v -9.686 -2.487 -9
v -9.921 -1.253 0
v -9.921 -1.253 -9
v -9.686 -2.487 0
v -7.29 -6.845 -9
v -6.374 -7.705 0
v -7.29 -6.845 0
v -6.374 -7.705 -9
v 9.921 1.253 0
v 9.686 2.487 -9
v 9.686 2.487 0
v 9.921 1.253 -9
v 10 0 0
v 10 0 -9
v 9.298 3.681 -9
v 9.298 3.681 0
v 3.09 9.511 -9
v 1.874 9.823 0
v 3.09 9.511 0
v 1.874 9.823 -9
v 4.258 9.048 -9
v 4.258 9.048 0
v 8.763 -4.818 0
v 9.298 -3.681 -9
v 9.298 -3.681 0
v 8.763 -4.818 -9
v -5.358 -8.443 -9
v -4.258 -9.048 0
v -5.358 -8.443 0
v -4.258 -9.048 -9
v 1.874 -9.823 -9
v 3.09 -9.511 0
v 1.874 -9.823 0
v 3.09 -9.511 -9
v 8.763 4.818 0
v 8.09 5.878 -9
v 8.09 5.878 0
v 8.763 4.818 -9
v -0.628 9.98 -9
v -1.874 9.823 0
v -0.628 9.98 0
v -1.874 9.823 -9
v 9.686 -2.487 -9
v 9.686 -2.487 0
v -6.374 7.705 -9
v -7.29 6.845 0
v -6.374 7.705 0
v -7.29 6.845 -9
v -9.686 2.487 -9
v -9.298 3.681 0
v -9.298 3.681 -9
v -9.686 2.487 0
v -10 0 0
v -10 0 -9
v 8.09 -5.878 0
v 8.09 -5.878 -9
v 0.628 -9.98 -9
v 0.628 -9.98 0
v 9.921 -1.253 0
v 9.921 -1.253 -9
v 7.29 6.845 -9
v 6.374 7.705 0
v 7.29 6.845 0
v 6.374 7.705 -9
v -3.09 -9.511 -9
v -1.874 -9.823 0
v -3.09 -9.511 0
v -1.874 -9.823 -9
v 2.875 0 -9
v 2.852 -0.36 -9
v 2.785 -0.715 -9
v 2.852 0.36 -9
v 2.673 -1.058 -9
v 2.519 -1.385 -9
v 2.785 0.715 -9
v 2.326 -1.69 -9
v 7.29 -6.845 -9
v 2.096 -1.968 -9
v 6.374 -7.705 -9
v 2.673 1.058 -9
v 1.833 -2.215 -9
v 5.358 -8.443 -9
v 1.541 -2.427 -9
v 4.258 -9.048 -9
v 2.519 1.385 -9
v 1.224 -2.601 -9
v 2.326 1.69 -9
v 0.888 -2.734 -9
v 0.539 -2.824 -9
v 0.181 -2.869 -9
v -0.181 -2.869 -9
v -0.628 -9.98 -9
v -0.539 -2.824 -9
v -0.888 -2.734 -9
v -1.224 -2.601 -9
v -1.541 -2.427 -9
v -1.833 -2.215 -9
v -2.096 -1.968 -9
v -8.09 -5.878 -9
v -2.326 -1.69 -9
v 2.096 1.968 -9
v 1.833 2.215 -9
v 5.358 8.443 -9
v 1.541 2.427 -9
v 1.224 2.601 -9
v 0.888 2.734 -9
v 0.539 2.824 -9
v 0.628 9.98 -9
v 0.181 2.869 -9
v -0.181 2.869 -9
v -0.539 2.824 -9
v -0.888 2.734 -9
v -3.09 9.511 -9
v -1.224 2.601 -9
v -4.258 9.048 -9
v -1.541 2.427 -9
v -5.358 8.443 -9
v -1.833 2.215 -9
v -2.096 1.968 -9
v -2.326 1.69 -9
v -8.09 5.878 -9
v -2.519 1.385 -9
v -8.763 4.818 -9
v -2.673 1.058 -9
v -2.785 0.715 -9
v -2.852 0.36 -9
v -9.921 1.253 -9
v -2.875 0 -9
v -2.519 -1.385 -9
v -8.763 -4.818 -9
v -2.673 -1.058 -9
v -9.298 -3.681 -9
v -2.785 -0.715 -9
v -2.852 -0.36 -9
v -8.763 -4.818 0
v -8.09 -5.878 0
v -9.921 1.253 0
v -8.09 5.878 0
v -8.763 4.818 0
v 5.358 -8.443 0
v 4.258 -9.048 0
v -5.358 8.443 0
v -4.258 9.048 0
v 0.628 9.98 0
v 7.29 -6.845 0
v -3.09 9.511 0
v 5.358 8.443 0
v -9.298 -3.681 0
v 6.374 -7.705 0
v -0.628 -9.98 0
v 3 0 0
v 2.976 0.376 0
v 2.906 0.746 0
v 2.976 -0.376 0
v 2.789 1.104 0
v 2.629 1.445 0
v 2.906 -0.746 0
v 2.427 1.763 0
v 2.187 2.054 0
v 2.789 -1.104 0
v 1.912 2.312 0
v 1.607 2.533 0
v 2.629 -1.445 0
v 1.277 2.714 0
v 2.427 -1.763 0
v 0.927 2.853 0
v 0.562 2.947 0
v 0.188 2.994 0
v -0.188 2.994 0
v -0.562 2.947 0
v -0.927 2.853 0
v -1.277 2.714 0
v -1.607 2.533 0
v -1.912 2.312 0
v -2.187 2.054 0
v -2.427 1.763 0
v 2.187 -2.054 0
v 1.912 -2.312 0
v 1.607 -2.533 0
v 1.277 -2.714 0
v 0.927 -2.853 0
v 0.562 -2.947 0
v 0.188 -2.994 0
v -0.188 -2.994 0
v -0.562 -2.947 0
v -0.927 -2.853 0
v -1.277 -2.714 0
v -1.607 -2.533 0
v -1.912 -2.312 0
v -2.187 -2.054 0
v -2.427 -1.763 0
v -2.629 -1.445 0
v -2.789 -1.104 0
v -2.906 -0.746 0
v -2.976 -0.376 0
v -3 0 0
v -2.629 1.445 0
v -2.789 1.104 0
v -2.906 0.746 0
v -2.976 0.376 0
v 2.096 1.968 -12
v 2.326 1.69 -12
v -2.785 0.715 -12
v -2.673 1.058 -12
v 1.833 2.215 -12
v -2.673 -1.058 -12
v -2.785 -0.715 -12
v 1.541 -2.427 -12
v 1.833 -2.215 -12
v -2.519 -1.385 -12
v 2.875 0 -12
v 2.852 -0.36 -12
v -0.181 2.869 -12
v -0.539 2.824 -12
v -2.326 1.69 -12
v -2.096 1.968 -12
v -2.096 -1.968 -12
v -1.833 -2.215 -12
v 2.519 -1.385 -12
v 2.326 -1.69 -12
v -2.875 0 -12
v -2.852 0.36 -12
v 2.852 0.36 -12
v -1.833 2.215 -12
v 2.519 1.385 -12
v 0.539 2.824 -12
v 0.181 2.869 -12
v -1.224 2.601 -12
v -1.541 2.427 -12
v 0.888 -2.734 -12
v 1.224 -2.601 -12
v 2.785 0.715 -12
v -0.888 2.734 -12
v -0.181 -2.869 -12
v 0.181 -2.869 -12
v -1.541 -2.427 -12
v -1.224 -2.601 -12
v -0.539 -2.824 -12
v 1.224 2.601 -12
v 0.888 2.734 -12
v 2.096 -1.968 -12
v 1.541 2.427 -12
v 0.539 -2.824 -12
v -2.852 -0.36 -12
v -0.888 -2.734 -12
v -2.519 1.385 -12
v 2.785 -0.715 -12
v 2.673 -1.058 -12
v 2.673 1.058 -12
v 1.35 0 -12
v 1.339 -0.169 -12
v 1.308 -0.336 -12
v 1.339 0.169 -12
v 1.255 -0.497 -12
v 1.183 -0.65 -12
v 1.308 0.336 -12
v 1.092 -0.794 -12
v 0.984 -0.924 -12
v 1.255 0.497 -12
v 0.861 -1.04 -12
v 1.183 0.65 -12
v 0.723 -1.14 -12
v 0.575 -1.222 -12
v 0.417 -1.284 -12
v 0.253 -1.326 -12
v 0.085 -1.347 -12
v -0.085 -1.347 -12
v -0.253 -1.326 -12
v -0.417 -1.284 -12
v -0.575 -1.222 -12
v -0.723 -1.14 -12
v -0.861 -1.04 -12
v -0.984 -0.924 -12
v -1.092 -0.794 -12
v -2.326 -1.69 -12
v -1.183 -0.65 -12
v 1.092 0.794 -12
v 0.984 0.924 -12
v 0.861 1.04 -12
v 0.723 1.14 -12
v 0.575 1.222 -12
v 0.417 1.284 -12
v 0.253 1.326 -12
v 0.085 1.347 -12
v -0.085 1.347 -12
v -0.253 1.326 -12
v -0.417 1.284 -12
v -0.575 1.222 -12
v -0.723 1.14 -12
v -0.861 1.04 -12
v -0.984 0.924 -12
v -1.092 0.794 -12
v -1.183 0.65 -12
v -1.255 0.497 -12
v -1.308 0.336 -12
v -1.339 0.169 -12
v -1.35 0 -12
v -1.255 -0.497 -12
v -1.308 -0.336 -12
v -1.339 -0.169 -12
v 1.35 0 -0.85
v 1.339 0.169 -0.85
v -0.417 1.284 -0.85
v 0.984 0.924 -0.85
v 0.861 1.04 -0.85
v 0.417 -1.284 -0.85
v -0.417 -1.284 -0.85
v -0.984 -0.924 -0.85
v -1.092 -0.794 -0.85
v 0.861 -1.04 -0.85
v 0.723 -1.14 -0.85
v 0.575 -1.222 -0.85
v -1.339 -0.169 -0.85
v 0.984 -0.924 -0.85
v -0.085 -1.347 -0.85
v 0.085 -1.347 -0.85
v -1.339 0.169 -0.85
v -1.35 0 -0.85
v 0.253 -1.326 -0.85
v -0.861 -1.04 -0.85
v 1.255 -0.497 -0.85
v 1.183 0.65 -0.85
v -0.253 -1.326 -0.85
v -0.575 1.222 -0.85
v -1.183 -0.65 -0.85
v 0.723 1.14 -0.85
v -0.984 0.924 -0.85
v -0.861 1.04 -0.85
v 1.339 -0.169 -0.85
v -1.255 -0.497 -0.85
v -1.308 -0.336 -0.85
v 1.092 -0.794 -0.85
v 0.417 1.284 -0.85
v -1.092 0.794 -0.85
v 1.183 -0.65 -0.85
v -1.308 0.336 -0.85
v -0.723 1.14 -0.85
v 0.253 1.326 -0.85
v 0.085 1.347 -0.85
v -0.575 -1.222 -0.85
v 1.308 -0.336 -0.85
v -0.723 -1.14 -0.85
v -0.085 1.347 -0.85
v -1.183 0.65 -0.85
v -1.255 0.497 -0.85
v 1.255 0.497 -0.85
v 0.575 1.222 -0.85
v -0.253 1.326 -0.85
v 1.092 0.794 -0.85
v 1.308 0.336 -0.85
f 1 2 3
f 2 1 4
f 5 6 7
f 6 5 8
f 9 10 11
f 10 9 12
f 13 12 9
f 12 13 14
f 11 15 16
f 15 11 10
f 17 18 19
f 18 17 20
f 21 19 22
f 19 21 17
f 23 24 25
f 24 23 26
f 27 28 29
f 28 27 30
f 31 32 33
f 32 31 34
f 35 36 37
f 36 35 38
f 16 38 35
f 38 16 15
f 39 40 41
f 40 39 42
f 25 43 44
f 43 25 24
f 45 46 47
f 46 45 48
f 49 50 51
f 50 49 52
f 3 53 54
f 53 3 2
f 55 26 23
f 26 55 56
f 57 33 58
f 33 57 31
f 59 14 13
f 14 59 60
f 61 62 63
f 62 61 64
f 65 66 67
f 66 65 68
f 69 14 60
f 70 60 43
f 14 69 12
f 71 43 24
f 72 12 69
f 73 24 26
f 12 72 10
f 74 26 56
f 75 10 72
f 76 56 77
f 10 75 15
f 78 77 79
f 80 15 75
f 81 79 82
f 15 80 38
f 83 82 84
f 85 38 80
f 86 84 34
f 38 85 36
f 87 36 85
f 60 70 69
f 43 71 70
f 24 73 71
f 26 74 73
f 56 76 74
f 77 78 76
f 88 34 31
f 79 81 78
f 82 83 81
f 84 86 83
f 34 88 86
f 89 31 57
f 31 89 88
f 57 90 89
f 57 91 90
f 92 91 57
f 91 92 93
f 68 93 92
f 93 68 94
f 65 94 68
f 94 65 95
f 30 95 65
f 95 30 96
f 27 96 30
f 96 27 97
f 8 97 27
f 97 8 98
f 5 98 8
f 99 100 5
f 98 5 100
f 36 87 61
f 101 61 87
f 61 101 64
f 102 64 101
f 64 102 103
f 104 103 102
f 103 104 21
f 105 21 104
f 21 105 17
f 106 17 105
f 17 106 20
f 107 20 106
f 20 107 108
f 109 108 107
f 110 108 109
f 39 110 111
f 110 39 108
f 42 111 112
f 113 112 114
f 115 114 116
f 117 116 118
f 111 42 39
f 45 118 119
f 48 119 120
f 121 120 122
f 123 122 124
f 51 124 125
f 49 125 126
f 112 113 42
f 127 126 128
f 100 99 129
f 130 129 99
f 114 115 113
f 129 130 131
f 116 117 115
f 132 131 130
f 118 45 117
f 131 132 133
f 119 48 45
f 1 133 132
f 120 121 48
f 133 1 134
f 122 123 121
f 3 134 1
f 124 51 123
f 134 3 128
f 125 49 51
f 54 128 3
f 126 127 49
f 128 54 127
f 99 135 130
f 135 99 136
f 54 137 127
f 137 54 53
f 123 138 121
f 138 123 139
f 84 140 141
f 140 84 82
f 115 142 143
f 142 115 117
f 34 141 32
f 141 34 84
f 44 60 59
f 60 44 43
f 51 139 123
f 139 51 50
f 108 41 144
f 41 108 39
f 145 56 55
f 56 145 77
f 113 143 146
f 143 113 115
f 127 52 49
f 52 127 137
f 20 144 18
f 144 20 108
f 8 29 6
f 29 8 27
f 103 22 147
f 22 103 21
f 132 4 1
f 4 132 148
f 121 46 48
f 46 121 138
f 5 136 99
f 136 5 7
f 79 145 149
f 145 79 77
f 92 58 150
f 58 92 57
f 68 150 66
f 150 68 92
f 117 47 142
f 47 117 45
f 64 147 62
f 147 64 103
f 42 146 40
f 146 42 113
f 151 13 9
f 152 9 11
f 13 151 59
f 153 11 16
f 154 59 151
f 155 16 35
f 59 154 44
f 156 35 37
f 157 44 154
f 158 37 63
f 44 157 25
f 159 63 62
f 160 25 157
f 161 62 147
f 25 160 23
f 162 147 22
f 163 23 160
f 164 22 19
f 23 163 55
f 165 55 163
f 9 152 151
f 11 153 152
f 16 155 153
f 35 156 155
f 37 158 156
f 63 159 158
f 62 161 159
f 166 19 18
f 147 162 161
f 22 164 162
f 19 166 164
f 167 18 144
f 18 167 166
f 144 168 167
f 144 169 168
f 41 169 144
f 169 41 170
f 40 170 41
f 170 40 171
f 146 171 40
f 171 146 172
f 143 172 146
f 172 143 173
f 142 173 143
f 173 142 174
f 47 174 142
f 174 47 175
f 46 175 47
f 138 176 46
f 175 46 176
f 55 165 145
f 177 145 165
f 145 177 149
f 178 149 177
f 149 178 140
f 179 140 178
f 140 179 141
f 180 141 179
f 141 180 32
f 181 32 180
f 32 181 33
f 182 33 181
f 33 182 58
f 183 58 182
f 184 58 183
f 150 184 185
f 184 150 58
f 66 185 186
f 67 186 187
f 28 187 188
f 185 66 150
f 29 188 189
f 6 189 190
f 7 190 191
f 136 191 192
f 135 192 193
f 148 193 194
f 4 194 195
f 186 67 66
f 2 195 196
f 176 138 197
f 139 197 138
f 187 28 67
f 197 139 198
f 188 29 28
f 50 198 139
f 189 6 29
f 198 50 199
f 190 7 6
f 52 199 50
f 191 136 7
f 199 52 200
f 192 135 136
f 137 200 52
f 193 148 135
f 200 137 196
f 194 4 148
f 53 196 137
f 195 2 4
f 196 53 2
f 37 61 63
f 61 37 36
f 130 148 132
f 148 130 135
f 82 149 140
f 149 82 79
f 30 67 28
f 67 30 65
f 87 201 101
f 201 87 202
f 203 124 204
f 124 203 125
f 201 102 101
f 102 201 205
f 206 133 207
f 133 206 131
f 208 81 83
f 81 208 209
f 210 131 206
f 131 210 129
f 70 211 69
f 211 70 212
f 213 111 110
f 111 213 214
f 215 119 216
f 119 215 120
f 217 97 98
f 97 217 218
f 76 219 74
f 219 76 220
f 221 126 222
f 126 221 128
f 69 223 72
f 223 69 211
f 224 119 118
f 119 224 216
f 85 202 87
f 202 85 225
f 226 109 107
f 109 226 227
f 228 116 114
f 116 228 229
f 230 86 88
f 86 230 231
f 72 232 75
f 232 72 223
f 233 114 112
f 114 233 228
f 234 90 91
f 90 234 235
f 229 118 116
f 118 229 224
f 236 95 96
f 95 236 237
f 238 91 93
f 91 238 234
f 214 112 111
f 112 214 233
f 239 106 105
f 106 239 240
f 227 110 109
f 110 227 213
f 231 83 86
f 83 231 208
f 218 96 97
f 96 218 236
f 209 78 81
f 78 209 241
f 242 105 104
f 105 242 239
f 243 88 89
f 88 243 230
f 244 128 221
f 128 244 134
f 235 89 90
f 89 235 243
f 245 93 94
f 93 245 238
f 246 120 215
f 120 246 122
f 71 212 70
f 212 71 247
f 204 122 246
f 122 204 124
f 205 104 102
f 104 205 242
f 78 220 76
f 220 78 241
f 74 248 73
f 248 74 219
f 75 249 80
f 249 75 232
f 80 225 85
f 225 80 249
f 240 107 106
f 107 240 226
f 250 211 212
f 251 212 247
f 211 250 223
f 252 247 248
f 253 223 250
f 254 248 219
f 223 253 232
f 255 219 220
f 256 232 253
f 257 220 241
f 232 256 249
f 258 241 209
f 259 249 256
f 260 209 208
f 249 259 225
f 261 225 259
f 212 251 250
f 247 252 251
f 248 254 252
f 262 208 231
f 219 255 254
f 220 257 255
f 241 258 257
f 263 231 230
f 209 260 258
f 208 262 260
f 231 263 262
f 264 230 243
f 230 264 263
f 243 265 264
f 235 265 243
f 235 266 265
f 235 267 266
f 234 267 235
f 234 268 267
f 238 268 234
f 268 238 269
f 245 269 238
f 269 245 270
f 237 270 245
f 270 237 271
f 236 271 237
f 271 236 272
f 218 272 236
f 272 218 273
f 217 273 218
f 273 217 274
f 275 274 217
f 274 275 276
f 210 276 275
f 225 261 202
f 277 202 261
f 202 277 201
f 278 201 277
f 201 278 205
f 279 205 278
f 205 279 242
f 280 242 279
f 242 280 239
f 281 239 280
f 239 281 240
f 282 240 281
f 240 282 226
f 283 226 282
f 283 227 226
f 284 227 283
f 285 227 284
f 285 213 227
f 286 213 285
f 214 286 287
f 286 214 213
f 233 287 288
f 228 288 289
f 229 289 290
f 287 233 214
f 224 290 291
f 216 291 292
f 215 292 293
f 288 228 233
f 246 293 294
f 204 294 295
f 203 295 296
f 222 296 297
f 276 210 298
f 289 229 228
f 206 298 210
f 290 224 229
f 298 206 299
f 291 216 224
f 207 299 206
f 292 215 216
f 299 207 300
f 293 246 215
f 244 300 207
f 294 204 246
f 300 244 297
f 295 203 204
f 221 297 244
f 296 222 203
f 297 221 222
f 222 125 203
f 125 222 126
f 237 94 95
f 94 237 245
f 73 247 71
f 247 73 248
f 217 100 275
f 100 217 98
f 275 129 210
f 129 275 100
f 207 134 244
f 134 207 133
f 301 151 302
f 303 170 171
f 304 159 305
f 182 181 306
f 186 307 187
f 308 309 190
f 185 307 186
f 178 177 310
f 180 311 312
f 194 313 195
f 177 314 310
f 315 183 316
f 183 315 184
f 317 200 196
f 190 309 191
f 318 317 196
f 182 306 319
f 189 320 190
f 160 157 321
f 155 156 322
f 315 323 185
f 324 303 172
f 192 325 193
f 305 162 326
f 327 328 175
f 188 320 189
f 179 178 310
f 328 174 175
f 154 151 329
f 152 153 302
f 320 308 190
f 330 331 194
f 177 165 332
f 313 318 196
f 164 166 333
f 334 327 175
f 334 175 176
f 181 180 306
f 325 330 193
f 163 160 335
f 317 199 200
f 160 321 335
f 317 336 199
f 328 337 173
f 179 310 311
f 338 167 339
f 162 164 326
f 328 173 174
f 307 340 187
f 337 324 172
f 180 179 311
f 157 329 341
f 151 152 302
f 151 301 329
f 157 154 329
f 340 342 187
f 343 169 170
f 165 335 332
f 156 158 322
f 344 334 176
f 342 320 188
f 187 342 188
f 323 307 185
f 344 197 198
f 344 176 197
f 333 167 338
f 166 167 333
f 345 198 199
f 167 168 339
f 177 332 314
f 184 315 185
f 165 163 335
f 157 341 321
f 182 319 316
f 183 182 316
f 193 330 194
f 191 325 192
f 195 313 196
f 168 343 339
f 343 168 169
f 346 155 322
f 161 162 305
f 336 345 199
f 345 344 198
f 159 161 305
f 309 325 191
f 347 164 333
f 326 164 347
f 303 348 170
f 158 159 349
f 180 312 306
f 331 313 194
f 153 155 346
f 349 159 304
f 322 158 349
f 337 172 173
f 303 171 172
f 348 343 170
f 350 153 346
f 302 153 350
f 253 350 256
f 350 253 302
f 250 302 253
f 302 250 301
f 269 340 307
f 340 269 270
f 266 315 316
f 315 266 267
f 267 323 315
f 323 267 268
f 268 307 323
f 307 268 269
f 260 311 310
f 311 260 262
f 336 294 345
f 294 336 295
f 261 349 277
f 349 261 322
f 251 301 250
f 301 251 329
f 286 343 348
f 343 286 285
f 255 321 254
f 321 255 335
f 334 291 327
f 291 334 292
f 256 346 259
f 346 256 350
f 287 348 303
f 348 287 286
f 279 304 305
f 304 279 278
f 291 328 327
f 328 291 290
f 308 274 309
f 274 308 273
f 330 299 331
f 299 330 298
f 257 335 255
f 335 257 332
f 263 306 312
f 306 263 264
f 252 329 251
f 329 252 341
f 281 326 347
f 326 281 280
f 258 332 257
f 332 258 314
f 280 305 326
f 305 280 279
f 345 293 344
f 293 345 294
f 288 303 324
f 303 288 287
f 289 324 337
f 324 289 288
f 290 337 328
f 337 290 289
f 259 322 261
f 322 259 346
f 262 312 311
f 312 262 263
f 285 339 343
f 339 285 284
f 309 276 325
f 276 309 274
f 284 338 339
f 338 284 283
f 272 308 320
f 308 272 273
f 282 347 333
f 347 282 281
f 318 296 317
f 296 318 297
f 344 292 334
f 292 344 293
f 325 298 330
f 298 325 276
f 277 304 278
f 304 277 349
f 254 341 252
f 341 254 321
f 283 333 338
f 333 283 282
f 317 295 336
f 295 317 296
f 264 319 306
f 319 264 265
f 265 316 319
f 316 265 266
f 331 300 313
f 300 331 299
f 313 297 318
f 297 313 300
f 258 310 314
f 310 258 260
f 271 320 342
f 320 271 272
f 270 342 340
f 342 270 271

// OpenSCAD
$fn = 50;


difference() {
	union() {
		translate(v = [0, 0, -9.0000000000]) {
			cylinder(h = 9, r = 10.0000000000);
		}
		#translate(v = [0, 0, -12.0000000000]) {
			cylinder(h = 12, r = 2.8750000000);
		}
	}
	union() {
		translate(v = [0, 0, 0]) {
			rotate(a = [0, 0, 0]) {
				difference() {
					union() {
						translate(v = [0, 0, -12.0000000000]) {
							cylinder(h = 12, r = 1.0000000000);
						}
						translate(v = [0, 0, -0.8500000000]) {
							cylinder(h = 0.8500000000, r1 = 1.3500000000, r2 = 3.0000000000);
						}
						translate(v = [0, 0, -12.0000000000]) {
							cylinder(h = 12, r = 1.3500000000);
						}
						translate(v = [0, 0, -12.0000000000]) {
							cylinder(h = 12, r = 1.0000000000);
						}
					}
					union();
				}
			}
		}
	}
}
